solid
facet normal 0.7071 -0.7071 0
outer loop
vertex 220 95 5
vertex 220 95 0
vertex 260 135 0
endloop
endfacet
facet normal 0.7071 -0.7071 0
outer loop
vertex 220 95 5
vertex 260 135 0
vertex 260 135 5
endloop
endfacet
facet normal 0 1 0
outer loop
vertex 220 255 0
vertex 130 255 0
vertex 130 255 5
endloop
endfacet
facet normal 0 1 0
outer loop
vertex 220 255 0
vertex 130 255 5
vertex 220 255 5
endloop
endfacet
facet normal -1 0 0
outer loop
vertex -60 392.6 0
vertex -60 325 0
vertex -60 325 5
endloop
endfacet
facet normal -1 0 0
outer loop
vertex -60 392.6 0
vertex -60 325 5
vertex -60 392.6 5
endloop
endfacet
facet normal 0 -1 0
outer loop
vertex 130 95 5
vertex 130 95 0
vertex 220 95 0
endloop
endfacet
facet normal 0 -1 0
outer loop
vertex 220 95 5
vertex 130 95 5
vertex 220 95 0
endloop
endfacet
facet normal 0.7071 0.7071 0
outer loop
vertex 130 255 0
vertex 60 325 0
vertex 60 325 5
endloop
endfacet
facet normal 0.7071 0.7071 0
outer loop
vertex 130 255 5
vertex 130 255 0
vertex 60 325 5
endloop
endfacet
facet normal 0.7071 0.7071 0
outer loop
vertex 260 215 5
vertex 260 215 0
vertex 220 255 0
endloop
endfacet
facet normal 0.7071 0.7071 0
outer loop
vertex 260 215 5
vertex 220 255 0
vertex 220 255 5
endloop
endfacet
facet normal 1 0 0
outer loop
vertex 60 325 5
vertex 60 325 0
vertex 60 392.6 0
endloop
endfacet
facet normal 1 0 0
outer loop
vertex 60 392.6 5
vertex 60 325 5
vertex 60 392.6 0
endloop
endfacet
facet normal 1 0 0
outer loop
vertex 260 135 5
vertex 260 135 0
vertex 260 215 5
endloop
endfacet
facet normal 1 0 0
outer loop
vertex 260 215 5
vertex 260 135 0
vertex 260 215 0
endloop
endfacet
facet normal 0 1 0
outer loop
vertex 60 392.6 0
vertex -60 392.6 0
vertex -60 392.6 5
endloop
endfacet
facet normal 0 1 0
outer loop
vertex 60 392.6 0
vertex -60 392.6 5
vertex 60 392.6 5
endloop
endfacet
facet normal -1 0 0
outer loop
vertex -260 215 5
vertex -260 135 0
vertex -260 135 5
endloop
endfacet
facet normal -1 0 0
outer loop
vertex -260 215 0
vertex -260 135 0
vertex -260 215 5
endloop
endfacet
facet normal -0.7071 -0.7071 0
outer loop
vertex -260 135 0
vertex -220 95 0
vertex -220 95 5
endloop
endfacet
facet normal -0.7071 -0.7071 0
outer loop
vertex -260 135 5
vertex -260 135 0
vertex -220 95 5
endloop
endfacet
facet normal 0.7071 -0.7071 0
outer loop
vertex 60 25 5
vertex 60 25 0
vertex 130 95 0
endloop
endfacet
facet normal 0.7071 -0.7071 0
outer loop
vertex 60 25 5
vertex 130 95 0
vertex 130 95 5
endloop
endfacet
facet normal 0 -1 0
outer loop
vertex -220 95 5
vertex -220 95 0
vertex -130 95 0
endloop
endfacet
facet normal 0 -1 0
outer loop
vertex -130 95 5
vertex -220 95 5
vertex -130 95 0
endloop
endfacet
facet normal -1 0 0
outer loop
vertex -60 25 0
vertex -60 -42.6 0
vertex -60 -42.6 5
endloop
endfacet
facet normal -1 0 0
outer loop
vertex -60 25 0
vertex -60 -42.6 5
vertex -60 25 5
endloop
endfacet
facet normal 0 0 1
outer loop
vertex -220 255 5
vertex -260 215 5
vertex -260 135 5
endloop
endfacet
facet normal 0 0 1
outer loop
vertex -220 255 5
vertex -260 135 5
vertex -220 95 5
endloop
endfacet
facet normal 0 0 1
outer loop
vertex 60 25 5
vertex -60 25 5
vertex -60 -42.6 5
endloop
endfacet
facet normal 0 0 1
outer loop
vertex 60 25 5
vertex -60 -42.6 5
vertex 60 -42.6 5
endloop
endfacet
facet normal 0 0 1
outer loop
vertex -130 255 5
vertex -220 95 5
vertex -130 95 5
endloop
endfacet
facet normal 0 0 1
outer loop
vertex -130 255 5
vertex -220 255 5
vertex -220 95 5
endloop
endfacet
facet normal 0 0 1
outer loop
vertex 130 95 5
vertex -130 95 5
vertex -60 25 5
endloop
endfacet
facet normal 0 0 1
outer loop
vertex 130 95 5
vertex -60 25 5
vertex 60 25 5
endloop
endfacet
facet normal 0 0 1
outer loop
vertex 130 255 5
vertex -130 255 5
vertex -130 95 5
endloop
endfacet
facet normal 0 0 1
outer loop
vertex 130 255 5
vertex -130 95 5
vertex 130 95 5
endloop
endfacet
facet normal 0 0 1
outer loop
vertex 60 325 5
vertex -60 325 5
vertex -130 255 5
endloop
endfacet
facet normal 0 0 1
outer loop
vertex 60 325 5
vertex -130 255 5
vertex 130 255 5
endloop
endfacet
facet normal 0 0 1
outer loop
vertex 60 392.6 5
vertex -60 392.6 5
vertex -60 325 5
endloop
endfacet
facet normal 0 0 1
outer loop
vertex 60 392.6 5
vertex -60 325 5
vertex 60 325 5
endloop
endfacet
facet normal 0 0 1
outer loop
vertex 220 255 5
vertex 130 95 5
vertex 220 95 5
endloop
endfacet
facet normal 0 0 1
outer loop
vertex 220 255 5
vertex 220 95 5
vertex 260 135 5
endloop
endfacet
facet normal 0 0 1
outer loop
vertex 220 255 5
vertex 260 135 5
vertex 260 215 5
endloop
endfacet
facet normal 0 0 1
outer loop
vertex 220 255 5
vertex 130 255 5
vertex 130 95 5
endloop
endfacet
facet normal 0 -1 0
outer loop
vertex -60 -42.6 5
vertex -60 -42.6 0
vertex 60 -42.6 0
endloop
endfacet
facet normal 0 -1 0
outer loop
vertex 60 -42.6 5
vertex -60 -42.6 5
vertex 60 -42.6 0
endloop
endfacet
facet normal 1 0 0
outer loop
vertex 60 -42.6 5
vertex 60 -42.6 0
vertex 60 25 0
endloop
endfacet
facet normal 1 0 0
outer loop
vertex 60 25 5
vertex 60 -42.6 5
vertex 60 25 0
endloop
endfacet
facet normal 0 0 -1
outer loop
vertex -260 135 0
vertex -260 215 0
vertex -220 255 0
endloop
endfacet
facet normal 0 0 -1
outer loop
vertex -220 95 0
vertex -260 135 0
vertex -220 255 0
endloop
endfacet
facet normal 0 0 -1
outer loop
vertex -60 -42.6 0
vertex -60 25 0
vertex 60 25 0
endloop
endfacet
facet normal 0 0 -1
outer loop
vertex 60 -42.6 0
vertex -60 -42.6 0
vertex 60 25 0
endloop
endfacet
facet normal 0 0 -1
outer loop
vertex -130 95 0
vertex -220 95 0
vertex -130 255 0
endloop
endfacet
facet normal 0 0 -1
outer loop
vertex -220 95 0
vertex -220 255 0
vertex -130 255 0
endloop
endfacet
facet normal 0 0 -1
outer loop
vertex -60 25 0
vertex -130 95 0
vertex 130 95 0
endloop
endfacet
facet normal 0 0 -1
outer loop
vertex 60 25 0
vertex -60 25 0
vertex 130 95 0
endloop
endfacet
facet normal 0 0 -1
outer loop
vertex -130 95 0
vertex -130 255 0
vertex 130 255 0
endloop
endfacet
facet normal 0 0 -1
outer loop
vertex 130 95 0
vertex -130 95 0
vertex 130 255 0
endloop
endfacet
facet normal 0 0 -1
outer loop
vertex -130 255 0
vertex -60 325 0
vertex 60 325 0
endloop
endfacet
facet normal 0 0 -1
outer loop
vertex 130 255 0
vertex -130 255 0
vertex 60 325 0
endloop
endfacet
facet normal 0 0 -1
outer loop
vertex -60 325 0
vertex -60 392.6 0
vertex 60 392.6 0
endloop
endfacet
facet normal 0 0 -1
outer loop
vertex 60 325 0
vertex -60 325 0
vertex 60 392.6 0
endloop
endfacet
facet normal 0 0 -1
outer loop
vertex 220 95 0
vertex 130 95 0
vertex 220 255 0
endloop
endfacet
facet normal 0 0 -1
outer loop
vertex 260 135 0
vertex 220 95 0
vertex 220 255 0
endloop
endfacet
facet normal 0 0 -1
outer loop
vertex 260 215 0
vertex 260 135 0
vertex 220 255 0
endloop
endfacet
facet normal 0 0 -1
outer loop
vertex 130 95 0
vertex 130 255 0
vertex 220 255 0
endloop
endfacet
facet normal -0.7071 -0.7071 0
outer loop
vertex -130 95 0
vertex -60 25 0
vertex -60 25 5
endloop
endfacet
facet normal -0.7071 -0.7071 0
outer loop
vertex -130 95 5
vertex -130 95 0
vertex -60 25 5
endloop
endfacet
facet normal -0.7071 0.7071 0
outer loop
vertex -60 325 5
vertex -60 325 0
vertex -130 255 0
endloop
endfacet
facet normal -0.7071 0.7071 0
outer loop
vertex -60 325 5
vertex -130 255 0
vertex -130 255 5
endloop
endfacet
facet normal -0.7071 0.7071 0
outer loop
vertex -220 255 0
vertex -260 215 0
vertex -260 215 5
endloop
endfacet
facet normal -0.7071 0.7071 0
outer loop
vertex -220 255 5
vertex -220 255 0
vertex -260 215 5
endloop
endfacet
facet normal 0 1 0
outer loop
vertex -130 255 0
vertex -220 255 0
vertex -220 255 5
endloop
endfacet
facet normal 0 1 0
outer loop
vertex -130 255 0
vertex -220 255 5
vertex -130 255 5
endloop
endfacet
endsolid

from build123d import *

# Parameters (mm, degrees)
SKETCH1_W           = 120
SKETCH1_H           = 137.6
SKETCH1_W_2         = 200
SKETCH1_H_2         = 160
BOSS_EXTRUDE1_DEPTH = 5
CHAMFER1_SIZE       = 70
CHAMFER2_SIZE       = 40


with BuildPart() as part:
    # Sketch1 → Boss-Extrude1 (new body)
    with BuildSketch(Plane.XY):
        with Locations((0, 323.8)):
            Rectangle(SKETCH1_W, SKETCH1_H)
        with Locations((-160, 175)):
            Rectangle(SKETCH1_W_2, SKETCH1_H_2)
        with Locations((0, 175)):
            Rectangle(SKETCH1_W, SKETCH1_H_2)
        with Locations((160, 175)):
            Rectangle(SKETCH1_W_2, SKETCH1_H_2)
        with Locations((0, 26.2)):
            Rectangle(SKETCH1_W, SKETCH1_H)
    extrude(amount=BOSS_EXTRUDE1_DEPTH)

    # Chamfer1
    chamfer1_edges = [part.edges().sort_by_distance(p)[0] for p in [
        (60, 255, 2.5),
        (60, 95, 2.5),
        (-60, 95, 2.5),
        (-60, 255, 2.5),
    ]]
    chamfer(chamfer1_edges, length=CHAMFER1_SIZE)

    # Chamfer2
    chamfer2_edges = [part.edges().sort_by_distance(p)[0] for p in [
        (260, 255, 2.5),
        (260, 95, 2.5),
        (-260, 95, 2.5),
        (-260, 255, 2.5),
    ]]
    chamfer(chamfer2_edges, length=CHAMFER2_SIZE)


solid = part.part
